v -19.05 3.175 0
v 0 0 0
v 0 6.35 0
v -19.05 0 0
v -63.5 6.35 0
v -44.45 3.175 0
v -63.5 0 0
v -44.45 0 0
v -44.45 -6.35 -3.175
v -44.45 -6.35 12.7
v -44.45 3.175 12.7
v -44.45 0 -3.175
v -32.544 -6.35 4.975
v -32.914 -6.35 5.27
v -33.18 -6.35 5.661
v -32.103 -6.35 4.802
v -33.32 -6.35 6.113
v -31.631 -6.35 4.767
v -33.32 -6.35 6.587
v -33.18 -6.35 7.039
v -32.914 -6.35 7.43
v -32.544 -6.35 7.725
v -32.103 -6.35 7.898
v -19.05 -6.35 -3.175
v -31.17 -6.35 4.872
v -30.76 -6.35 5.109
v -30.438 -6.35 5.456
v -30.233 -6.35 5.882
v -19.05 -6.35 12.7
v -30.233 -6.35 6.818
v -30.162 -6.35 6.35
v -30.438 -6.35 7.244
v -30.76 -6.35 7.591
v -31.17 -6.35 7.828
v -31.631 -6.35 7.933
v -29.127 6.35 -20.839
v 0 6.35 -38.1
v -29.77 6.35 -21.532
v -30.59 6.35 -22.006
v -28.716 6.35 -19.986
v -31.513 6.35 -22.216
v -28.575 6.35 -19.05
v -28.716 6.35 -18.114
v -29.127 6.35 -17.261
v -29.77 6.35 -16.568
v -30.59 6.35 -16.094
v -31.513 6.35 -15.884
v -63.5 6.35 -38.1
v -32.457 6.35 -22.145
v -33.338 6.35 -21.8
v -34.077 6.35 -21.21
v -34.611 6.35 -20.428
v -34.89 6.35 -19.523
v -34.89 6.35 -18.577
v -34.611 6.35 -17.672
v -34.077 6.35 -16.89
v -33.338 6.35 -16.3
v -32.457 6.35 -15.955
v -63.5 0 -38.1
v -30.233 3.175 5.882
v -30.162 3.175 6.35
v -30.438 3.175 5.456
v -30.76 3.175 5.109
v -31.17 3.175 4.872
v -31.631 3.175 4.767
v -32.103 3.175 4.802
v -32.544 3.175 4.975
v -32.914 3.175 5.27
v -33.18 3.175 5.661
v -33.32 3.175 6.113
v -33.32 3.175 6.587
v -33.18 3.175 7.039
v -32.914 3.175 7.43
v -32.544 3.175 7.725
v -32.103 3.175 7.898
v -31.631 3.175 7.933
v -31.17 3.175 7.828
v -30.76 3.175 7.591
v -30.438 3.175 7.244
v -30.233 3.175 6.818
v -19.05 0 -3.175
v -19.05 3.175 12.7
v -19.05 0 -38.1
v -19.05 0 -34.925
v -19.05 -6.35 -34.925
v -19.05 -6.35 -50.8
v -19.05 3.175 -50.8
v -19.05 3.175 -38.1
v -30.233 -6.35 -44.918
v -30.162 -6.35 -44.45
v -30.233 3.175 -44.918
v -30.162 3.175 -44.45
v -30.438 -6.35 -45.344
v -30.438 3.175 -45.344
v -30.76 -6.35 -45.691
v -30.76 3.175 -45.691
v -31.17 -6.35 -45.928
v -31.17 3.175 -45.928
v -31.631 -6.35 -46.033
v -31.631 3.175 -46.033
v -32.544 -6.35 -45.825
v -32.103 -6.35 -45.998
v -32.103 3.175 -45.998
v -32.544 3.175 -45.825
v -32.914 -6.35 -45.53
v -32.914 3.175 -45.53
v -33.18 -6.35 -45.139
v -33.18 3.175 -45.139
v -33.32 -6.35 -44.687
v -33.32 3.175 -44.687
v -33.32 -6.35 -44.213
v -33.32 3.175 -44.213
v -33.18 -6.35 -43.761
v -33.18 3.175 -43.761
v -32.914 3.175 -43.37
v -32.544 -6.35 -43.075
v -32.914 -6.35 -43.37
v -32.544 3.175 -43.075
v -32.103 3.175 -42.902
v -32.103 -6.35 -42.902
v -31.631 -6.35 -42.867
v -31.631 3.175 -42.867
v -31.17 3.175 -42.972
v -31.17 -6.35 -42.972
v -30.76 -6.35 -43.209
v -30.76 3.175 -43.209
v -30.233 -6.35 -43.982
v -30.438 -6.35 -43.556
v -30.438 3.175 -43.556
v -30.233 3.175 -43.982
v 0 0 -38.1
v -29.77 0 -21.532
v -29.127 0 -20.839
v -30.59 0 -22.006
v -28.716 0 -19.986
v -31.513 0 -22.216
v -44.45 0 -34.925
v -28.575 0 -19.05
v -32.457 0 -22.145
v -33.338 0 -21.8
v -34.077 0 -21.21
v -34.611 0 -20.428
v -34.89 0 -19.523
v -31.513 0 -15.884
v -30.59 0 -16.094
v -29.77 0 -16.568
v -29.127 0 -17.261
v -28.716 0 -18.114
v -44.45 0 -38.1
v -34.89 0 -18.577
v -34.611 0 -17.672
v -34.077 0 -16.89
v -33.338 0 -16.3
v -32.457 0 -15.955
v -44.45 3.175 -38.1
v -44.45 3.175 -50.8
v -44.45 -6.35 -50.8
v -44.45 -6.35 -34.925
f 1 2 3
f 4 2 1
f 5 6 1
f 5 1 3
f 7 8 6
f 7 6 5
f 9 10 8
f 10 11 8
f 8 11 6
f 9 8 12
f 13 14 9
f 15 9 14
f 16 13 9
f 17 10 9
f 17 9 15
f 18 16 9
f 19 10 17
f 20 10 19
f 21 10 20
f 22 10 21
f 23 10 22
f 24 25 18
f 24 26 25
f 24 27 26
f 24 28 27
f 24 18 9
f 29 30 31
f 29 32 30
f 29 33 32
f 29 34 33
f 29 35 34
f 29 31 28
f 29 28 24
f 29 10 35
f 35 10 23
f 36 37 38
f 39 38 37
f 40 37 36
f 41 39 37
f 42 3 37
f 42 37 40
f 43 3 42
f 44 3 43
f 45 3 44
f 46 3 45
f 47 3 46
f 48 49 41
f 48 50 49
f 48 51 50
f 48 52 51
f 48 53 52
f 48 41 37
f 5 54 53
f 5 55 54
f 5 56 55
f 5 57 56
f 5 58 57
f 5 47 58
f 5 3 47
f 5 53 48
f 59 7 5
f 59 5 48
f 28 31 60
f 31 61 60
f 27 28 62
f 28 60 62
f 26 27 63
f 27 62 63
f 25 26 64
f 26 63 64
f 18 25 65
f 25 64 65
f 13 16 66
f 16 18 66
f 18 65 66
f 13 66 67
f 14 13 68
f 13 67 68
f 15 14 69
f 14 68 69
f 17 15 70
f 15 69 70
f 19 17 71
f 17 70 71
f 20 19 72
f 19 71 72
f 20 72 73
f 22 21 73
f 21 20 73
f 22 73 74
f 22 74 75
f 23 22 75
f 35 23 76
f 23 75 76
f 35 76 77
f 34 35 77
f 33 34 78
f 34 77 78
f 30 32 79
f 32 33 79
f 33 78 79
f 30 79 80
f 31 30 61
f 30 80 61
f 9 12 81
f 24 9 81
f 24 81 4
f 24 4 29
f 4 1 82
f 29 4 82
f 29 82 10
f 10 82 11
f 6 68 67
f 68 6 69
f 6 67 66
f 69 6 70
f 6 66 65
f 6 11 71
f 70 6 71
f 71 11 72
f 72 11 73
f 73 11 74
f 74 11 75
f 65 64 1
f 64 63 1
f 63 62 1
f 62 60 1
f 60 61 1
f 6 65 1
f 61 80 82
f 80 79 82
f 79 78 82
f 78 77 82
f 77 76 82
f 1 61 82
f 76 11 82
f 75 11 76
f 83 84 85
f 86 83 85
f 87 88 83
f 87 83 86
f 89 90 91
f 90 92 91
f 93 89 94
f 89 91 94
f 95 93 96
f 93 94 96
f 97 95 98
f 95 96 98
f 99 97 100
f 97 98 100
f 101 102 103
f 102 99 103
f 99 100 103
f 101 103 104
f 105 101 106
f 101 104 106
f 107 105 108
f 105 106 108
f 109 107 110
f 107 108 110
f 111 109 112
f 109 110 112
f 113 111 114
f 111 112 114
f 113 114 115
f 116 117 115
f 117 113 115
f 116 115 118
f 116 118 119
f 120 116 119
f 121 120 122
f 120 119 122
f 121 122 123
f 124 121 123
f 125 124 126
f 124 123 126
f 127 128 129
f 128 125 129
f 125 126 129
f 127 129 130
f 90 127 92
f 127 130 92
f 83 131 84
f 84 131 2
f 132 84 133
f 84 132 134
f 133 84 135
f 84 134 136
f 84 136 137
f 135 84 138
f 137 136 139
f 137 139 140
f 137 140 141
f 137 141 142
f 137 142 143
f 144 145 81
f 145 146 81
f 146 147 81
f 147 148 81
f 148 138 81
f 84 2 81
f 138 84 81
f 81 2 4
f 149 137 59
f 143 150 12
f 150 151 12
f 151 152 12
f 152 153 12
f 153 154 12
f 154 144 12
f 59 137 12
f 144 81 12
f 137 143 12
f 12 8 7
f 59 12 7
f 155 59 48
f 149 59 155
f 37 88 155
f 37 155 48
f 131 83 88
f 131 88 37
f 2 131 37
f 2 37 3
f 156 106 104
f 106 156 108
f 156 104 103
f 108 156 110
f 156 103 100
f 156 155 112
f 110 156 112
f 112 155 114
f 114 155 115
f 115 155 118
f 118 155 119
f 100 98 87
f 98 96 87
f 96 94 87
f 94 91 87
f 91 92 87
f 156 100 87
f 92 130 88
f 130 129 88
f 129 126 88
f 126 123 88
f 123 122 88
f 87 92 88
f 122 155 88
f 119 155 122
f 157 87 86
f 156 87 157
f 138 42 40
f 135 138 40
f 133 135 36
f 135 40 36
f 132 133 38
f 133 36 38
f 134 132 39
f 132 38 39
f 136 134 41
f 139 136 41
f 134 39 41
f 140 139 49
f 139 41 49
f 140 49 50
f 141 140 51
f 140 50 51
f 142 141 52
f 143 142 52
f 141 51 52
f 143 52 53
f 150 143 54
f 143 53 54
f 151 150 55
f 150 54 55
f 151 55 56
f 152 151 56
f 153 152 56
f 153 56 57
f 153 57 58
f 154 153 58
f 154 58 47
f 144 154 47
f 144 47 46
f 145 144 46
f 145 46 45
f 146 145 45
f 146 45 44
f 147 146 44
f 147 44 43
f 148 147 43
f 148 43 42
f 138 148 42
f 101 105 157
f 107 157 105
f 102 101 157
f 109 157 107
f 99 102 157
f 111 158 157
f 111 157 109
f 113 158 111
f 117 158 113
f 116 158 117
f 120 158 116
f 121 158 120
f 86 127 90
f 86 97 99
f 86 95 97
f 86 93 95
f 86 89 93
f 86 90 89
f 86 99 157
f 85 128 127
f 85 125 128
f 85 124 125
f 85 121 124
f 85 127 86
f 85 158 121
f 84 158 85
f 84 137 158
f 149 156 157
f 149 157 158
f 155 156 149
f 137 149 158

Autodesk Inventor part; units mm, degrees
ref_plane "YZ Plane" through (0, 0, 0) normal (1, 0, 0) x (0, 1, 0)
ref_plane "XZ Plane" through (0, 0, 0) normal (0, 1, 0) x (-1, 0, 0)
ref_plane "XY Plane" through (0, 0, 0) normal (0, 0, 1) x (1, 0, 0)
sketch "Sketch1" plane through (0, 0, 0) normal (0, 1, 0) x (-1, 0, 0)
  line L0 (0, 0) -> (63.5, 0)
  line L1 (63.5, 0) -> (63.5, -38.1)
  line L2 (63.5, -38.1) -> (0, -38.1)
  line L3 (0, -38.1) -> (0, 0)
  dimension "d0" = 63.5
  dimension "d1" = 38.1
extrude "Extrusion1" add sketch "Sketch1" along normal blind 6.35
sketch "Sketch2" plane through (0, 6.35, 0) normal (0, 1, 0) x (1, 0, 0)
  line L0 (-63.5, 0) -> (0, 0) projected
  line L1 (0, 0) -> (0, 38.1) projected
  line L2 (0, 38.1) -> (-63.5, 38.1) projected
  line L3 (-63.5, 38.1) -> (-63.5, 0) projected
  line L4 (0, 0) -> (0, 38.1) construction
  line L5 (0, 19.05) -> (-31.75, 19.05) construction
  circle A0 centre (-31.75, 19.05) radius 3.175
  dimension "d4" = 31.75
  dimension "d5" = 90
  dimension "d6" = 6.35
extrude "Extrusion2" cut sketch "Sketch2" against normal blind 6.35 contours A0
sketch "Sketch3" plane through (0, 0, 0) normal (0, -1, 0) x (1, 0, 0)
  circle A0 centre (-31.75, -19.05) radius 3.175 projected
  line L0 (0, 0) -> (-63.5, 0) projected
  line L1 (-63.5, 0) -> (-63.5, -38.1) projected
  line L2 (-63.5, -38.1) -> (0, -38.1) projected
  line L3 (0, -38.1) -> (0, 0) projected
  line L4 (-31.75, -19.05) -> (-19.05, -19.05) construction
  line L5 (-19.05, -19.05) -> (-19.05, 12.7) construction
  line L6 (-19.05, 12.7) -> (-19.05, -50.8) construction
  line L7 (-19.05, 12.7) -> (-44.45, 12.7)
  line L8 (-44.45, 12.7) -> (-44.45, -3.175)
  line L9 (-44.45, -3.175) -> (-19.05, -3.175)
  line L10 (-19.05, -3.175) -> (-19.05, 12.7)
  circle A1 centre (-31.75, -19.05) radius 3.175 construction
  line L11 (-31.75, -19.05) -> (-31.75, 6.35) construction
  line L12 (-31.75, -19.05) -> (-6.35, -19.05) construction
  circle A2 centre (-31.75, 6.35) radius 1.5875
  line L13 (-19.05, -19.05) -> (-19.05, -50.8) construction
  line L14 (-19.05, -50.8) -> (-19.05, 12.7) construction
  line L15 (-19.05, -50.8) -> (-44.45, -50.8)
  line L16 (-44.45, -50.8) -> (-44.45, -34.925)
  line L17 (-44.45, -34.925) -> (-19.05, -34.925)
  line L18 (-19.05, -34.925) -> (-19.05, -50.8)
  circle A3 centre (-31.75, -44.45) radius 1.5875
  dimension "d9" = 12.7
  dimension "d10" = 31.75
  dimension "d11" = 63.5
  dimension "d12" = 25.4
  dimension "d13" = 15.875
  dimension "d14" = 25.4
  dimension "d15" = 90
  dimension "d16" = 3.175
extrude "Extrusion3" add sketch "Sketch3" along normal blind 6.35 and the other way blind 3.175 contours L10 L9 L8 L0 | L0 L8 L7 L10 | L18 L15 L16 L2 | L2 L16 L17 L18
properties part number "mount"
